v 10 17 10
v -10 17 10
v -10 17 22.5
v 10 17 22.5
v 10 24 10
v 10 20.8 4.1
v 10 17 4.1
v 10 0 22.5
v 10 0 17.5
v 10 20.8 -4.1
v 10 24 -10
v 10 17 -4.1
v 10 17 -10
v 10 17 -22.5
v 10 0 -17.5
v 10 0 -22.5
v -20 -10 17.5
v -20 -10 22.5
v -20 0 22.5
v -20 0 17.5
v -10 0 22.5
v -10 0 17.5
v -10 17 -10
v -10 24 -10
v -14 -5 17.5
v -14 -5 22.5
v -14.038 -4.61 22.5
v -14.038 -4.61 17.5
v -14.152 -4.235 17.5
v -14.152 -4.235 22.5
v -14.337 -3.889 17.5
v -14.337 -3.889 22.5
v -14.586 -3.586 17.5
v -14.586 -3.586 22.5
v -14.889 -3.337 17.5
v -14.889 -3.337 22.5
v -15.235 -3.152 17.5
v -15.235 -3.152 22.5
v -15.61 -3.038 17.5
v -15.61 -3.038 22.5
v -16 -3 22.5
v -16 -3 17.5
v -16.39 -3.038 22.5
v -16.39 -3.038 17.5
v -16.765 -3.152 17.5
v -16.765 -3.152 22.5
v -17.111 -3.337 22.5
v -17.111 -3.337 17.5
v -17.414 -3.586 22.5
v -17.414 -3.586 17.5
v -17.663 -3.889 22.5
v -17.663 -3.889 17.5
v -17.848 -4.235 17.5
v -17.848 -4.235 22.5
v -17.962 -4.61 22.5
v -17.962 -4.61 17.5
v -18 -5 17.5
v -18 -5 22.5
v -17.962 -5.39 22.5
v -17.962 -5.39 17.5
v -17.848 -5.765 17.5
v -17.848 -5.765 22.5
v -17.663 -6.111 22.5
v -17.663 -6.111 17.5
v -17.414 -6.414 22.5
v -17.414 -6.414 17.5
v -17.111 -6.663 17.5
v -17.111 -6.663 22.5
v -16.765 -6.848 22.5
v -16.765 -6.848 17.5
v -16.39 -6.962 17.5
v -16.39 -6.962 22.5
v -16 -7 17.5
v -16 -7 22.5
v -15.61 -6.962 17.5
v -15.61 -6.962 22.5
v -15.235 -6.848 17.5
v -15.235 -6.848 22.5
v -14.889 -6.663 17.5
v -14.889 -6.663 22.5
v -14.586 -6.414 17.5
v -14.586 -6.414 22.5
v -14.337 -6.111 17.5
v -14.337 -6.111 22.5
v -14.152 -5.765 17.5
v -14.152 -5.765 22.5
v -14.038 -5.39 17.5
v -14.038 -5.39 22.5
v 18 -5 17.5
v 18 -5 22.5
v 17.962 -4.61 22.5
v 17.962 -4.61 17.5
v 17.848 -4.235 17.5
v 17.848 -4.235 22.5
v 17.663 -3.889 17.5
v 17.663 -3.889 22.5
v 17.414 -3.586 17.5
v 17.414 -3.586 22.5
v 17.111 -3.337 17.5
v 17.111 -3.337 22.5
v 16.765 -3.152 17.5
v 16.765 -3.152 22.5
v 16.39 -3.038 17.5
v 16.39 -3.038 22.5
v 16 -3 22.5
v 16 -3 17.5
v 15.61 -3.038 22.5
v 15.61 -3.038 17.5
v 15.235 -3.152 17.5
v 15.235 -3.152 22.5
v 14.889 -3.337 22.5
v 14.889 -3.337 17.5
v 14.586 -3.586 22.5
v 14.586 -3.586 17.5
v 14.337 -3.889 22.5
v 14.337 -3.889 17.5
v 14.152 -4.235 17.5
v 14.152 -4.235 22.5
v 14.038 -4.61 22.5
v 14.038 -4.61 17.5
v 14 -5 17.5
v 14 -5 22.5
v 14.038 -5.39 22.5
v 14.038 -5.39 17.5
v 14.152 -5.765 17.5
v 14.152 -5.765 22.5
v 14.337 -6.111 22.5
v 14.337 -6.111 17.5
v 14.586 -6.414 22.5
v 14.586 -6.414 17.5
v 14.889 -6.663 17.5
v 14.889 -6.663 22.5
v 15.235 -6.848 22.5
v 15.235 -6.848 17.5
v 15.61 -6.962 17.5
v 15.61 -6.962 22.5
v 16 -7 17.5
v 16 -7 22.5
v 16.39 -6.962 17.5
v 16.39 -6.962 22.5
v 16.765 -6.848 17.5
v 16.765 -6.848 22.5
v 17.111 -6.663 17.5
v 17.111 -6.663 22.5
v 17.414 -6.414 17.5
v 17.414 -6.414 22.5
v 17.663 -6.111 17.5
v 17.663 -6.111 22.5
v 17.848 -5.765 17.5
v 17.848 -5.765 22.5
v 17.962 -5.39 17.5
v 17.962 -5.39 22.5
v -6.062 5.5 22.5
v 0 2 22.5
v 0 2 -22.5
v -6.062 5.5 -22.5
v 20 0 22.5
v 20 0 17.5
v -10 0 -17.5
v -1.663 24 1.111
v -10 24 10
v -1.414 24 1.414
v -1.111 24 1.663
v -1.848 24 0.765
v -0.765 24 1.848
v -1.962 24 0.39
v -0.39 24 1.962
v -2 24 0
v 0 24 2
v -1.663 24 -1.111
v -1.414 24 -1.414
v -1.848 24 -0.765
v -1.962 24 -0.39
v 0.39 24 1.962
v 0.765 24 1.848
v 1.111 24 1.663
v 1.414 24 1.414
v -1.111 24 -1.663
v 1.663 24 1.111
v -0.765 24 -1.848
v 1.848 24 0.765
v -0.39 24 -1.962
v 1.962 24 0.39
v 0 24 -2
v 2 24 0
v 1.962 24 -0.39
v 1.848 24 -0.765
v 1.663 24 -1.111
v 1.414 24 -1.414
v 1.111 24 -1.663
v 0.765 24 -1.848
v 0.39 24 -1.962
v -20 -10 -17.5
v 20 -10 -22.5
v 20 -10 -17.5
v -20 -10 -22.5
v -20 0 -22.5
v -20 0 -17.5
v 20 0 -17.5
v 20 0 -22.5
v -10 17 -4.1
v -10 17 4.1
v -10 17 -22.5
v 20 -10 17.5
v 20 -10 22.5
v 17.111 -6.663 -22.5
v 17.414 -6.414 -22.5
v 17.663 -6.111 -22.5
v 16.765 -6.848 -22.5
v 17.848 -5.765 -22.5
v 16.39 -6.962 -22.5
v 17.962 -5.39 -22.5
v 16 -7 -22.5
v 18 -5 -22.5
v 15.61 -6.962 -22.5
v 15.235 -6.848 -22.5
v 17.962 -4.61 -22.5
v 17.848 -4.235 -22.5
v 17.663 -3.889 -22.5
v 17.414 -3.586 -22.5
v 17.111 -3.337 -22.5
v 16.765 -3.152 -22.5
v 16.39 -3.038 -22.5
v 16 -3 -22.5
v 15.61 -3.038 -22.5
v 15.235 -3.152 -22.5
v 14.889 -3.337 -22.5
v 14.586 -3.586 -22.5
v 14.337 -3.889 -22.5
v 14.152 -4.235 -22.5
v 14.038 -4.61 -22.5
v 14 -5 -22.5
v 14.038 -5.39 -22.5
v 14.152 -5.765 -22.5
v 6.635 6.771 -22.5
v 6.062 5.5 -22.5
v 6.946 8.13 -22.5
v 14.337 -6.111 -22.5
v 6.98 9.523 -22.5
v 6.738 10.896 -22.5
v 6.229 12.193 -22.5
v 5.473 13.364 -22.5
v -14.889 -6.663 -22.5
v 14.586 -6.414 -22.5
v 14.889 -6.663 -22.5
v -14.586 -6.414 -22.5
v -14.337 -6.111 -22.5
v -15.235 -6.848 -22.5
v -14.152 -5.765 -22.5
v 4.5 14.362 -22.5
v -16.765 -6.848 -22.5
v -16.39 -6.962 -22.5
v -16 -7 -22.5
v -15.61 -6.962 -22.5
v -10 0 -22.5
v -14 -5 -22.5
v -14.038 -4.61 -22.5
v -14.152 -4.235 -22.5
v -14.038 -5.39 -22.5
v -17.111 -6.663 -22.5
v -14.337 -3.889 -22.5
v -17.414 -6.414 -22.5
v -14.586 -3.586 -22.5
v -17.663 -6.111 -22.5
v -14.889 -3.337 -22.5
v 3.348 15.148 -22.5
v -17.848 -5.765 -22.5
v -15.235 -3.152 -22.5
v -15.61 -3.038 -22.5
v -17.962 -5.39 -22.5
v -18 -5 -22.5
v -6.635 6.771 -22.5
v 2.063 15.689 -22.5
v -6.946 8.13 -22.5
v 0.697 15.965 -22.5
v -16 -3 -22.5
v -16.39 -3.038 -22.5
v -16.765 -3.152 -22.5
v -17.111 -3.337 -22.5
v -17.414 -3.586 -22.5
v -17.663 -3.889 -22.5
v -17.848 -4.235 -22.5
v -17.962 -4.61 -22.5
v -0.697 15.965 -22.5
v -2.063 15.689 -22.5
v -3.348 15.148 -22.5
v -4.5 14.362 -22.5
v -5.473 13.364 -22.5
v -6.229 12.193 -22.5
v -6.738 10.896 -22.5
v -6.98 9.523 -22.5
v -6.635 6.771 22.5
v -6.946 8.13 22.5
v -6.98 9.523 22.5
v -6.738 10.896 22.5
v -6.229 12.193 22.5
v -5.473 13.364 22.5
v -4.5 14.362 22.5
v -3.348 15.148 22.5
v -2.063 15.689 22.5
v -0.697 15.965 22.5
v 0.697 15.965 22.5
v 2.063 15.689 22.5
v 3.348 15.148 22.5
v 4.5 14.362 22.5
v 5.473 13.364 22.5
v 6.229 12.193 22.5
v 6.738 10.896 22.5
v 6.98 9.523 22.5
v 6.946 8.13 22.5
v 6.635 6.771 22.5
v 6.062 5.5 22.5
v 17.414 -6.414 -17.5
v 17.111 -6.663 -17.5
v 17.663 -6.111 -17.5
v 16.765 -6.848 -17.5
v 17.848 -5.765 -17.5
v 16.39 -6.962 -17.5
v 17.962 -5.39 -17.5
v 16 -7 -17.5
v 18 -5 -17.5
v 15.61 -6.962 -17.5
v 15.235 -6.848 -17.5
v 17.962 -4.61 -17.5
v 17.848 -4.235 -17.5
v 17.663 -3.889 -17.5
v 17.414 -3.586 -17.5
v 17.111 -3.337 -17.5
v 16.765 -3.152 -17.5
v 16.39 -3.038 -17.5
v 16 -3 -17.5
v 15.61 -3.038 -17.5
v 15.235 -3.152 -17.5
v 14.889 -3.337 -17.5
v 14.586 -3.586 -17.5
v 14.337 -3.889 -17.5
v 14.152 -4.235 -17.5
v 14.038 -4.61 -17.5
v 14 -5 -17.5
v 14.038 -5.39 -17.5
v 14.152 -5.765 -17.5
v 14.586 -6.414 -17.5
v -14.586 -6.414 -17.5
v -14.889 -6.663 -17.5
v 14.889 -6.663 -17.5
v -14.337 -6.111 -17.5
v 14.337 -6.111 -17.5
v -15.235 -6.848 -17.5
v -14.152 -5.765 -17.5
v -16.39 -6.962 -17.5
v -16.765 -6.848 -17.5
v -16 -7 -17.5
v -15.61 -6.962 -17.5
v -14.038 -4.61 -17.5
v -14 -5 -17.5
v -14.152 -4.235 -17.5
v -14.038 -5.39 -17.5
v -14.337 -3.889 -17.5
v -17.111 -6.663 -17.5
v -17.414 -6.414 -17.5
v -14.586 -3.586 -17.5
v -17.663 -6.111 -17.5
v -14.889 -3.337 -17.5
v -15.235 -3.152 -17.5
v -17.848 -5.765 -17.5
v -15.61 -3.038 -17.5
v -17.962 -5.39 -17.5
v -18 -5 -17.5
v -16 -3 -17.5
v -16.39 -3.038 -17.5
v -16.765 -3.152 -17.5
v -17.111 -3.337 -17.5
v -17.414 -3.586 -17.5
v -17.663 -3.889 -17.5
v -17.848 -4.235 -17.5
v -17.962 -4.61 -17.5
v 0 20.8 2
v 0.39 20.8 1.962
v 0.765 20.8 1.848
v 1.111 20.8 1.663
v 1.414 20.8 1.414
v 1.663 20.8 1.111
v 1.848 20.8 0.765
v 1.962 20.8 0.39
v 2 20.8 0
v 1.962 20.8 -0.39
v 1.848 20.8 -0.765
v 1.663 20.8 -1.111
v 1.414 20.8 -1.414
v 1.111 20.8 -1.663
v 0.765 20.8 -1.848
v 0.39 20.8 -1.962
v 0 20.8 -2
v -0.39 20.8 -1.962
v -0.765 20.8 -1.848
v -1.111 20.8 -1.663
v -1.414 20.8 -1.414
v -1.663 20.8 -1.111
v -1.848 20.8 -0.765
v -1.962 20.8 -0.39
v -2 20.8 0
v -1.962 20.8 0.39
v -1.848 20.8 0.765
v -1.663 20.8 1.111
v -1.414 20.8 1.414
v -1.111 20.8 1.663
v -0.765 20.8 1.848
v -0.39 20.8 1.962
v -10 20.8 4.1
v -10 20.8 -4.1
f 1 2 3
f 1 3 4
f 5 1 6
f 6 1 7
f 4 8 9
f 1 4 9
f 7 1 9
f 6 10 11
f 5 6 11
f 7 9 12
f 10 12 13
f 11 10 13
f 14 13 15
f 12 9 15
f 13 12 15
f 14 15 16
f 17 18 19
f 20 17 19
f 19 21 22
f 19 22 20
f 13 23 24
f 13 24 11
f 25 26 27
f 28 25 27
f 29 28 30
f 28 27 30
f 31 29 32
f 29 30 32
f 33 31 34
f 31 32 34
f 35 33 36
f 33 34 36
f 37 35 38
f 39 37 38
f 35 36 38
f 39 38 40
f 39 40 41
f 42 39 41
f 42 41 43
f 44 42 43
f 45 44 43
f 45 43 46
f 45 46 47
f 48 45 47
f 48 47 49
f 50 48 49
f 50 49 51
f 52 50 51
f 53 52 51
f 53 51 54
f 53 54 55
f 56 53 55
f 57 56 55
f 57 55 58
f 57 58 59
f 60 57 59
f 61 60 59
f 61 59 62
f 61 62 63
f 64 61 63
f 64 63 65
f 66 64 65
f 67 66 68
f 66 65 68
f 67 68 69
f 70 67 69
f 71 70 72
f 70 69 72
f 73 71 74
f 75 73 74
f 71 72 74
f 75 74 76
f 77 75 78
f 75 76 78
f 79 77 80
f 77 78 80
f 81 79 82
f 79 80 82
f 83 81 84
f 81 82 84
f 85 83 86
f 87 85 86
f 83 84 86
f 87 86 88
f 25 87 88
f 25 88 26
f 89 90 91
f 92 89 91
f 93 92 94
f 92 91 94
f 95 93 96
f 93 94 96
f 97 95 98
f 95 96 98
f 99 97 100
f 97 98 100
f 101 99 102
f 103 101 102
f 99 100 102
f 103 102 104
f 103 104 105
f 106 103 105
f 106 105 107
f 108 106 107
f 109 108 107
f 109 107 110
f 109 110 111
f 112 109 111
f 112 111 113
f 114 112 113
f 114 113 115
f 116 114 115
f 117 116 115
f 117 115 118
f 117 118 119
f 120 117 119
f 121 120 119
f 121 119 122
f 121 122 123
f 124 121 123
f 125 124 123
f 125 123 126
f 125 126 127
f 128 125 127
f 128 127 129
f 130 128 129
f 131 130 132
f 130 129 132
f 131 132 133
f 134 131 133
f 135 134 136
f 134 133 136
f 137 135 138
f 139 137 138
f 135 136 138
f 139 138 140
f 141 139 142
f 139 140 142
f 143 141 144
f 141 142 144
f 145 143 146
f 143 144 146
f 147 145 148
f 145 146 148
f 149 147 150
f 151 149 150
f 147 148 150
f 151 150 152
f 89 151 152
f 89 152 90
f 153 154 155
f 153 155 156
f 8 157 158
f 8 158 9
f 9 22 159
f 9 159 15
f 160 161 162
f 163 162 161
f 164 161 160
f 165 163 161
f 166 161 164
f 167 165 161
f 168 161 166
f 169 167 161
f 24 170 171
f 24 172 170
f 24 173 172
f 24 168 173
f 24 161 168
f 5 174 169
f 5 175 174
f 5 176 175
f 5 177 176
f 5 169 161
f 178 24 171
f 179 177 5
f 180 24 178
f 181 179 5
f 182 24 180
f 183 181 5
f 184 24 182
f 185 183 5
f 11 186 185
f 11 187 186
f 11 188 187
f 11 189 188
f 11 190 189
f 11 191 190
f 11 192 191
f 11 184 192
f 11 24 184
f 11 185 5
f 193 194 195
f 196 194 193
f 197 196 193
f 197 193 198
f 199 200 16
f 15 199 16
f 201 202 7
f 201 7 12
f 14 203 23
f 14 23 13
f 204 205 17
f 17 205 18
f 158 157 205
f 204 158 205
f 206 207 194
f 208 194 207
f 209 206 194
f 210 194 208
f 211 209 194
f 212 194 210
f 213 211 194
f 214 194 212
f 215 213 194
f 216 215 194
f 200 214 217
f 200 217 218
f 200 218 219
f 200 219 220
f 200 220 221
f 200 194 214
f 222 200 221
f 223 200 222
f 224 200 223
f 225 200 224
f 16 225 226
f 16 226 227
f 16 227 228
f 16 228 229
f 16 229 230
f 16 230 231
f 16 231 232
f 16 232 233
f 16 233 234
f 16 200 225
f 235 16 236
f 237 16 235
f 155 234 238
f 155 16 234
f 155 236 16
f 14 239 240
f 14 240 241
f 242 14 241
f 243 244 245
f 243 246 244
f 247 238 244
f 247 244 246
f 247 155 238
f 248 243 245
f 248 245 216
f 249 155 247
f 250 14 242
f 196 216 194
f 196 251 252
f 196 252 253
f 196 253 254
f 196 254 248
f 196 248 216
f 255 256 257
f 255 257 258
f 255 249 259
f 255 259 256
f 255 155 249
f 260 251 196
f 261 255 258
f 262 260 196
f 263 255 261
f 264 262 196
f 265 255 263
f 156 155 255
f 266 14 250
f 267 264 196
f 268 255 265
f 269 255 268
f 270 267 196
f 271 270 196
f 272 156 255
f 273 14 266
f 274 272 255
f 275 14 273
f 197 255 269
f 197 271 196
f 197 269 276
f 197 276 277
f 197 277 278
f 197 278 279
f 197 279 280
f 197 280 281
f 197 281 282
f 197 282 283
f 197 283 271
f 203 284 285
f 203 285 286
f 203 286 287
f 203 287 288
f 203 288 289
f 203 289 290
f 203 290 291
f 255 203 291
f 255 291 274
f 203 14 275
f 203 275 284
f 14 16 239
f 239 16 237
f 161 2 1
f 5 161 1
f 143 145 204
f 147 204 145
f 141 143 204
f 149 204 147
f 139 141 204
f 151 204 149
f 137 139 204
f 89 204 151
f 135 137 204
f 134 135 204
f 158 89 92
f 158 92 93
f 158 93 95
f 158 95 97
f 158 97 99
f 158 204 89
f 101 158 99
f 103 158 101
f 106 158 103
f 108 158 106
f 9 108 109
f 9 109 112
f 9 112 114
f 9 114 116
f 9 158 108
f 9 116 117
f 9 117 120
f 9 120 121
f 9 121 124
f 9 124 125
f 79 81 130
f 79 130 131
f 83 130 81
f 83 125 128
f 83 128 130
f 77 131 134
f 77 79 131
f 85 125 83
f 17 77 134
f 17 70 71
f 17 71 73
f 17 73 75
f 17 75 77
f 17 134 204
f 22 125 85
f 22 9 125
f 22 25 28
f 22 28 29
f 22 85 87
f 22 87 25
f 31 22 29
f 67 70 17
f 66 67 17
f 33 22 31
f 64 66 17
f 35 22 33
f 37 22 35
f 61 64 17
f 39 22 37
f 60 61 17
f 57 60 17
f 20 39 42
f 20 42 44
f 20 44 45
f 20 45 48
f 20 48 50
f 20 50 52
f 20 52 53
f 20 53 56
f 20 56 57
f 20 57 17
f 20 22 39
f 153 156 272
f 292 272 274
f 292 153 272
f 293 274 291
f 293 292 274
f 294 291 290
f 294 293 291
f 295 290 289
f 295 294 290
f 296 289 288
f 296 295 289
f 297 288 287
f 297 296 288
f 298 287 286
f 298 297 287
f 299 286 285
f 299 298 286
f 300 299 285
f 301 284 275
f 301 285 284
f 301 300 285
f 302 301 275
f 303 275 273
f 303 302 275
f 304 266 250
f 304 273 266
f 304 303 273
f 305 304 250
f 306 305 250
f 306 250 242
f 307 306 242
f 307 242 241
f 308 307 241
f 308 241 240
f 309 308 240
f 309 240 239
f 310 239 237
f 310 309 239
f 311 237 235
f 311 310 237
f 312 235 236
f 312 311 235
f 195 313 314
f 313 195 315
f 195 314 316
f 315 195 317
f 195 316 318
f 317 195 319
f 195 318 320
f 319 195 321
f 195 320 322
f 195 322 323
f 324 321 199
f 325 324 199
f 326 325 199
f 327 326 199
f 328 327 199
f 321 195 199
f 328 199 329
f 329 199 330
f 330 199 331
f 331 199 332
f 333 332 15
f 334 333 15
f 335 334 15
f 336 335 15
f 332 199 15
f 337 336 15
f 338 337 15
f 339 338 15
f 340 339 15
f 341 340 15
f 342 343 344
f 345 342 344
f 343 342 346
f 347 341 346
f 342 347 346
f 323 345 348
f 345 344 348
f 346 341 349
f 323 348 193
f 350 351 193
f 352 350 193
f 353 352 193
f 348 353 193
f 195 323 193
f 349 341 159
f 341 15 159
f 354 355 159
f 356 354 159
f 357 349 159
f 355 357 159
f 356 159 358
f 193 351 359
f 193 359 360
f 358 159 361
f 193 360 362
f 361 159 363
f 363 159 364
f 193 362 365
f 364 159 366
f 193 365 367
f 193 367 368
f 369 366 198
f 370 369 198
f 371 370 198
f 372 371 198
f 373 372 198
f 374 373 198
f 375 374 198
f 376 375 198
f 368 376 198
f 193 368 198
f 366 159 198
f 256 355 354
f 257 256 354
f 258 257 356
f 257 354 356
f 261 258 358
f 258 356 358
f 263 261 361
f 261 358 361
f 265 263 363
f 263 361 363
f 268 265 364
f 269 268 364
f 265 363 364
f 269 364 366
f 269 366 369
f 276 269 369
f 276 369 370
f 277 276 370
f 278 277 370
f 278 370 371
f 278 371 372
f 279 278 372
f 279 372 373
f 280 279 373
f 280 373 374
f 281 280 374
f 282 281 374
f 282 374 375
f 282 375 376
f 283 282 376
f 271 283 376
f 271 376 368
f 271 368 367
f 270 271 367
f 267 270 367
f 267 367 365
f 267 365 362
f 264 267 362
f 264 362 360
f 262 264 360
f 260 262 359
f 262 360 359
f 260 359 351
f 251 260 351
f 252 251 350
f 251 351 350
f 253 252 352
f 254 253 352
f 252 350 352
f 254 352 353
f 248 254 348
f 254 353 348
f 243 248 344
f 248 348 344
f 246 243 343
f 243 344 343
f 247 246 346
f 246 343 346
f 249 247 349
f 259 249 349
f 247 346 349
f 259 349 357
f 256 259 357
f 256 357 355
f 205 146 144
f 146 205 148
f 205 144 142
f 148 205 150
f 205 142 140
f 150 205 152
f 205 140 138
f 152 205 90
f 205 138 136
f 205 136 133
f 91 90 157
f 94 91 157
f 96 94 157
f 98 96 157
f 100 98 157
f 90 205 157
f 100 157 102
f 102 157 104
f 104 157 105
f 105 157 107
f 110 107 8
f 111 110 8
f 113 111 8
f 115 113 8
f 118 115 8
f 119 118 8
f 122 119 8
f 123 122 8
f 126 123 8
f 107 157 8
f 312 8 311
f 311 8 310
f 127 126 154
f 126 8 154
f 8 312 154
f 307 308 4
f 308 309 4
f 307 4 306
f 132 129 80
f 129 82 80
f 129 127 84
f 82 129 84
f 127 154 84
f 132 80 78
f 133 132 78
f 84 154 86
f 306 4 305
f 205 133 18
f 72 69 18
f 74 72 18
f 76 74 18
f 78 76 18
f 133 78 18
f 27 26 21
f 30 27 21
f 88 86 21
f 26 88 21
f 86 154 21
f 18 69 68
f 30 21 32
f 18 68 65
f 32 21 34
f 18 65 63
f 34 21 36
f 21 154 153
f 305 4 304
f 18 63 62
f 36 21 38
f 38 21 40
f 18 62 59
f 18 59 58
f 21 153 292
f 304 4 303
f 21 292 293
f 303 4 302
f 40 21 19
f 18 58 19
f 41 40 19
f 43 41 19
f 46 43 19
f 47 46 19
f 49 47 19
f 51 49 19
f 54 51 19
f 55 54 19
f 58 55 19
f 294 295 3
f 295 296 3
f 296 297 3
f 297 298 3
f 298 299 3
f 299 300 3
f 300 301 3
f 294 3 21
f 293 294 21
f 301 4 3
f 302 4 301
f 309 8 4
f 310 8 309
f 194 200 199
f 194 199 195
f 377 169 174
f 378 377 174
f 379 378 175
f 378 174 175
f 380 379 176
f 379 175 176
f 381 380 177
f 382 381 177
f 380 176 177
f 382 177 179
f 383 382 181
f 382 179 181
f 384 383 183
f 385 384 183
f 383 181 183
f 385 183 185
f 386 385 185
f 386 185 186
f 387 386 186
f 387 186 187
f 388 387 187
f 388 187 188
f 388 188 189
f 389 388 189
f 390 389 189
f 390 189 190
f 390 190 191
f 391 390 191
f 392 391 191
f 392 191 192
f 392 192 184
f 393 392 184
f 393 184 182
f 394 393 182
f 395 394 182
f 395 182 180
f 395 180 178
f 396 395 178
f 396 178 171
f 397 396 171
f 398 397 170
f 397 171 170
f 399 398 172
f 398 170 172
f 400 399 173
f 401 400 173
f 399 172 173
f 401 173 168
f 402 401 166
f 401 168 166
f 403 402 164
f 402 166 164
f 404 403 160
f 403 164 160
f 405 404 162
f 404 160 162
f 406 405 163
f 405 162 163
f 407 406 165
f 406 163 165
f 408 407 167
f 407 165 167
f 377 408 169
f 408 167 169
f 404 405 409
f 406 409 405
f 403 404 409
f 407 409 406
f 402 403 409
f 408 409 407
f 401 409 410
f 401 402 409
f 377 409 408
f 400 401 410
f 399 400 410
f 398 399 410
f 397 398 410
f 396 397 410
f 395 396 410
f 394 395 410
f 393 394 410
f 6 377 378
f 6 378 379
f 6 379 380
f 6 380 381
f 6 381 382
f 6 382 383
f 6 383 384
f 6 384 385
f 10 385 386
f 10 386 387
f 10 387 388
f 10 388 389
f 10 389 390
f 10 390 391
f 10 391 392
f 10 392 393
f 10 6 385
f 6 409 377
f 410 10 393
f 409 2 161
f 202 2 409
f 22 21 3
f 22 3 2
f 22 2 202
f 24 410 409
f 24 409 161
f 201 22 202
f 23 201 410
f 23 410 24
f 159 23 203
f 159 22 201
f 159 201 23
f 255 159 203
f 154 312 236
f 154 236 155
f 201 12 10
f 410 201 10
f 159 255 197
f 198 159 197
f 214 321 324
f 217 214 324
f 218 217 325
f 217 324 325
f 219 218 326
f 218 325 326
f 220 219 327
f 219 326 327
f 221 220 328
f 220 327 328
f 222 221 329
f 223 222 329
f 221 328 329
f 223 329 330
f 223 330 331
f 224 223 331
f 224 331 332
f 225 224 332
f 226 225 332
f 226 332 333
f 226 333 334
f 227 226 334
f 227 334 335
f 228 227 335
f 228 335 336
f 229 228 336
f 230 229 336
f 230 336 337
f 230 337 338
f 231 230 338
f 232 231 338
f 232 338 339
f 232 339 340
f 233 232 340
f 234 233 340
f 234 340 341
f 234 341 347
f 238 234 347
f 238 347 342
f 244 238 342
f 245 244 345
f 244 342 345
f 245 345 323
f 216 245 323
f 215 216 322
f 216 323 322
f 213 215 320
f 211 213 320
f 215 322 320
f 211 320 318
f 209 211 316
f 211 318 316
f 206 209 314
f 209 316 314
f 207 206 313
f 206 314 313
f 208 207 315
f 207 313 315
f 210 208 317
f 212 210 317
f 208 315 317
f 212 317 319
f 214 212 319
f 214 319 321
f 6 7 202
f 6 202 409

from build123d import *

# Parameters (mm, degrees)
SKETCH1_W           = 20
SKETCH1_H           = 45
BOSS_EXTRUDE1_DEPTH = 17
CUT_EXTRUDE1_DEPTH  = 50.132473986
BOSS_EXTRUDE2_DEPTH = 5
SKETCH4_R           = 2
CUT_EXTRUDE2_DEPTH  = 53.096065111
SKETCH6_W           = 20
SKETCH6_H           = 20
BOSS_EXTRUDE3_DEPTH = 7
SKETCH8_W           = 8.2
SKETCH8_H           = 3.8
CUT_EXTRUDE3_DEPTH  = 45.522466239
CUT_EXTRUDE4_REACH  = 47.412
SKETCH7_R           = 2


with BuildPart() as part:
    # Sketch1 → Boss-Extrude1 (new body)
    with BuildSketch(Plane(origin=(0, 0, 0), x_dir=(1, 0, 0), z_dir=(0, 1, 0))):
        Rectangle(SKETCH1_W, SKETCH1_H)
    extrude(amount=BOSS_EXTRUDE1_DEPTH)

    # Sketch2 → Cut-Extrude1 (cut, through all)
    with BuildSketch(Plane.XY.offset(22.5)):
        with BuildLine():
            Line((0, 2), (-6.062177826, 5.5))
            ThreePointArc((-6.062177826, 5.5), (0, 16), (6.062177826, 5.5))
            Line((6.062177826, 5.5), (0, 2))
        make_face()
    extrude(amount=-CUT_EXTRUDE1_DEPTH, mode=Mode.SUBTRACT)

    # Sketch3 → Boss-Extrude2 (add)
    with BuildSketch(Plane.XY.offset(22.5)):
        Polygon((10, 0), (20, 0), (20, -10), (-20, -10), (-20, 0), (-10, 0), align=None)
    boss_extrude2 = extrude(amount=-BOSS_EXTRUDE2_DEPTH)

    # Mirror1: Boss-Extrude2 across plane
    add(boss_extrude2.mirror(Plane.XY))

    # Sketch4 → Cut-Extrude2 (cut, through all)
    with BuildSketch(Plane.XY.offset(22.5)):
        with Locations((16, -5)):
            Circle(SKETCH4_R)
        with Locations((-16, -5)):
            Circle(SKETCH4_R)
    extrude(amount=-CUT_EXTRUDE2_DEPTH, mode=Mode.SUBTRACT)

    # Sketch6 → Boss-Extrude3 (add)
    with BuildSketch(Plane(origin=(0, 17, 0), x_dir=(1, 0, 0), z_dir=(0, 1, 0))):
        Rectangle(SKETCH6_W, SKETCH6_H)
    extrude(amount=BOSS_EXTRUDE3_DEPTH)

    # Sketch8 → Cut-Extrude3 (cut, through all)
    with BuildSketch(Plane(origin=(10, 0, 0), x_dir=(0, 0, -1), z_dir=(1, 0, 0))):
        with Locations((0, 18.9)):
            Rectangle(SKETCH8_W, SKETCH8_H)
    extrude(amount=-CUT_EXTRUDE3_DEPTH, mode=Mode.SUBTRACT)

    # Sketch7 → Cut-Extrude4 (cut, up to next)
    with BuildSketch(Plane(origin=(0, 24, 0), x_dir=(1, 0, 0), z_dir=(0, 1, 0)), mode=Mode.PRIVATE) as cut_extrude4_sk1:
        with Locations(Location((0, 0, 0), (0, 0, 270))):
            Circle(SKETCH7_R)
    cut_extrude4_tool1 = extrude(cut_extrude4_sk1.sketch, amount=-CUT_EXTRUDE4_REACH, mode=Mode.PRIVATE) & part.part
    add(cut_extrude4_tool1.solids().sort_by_distance((0, 24, 0))[0], mode=Mode.SUBTRACT)


solid = part.part
